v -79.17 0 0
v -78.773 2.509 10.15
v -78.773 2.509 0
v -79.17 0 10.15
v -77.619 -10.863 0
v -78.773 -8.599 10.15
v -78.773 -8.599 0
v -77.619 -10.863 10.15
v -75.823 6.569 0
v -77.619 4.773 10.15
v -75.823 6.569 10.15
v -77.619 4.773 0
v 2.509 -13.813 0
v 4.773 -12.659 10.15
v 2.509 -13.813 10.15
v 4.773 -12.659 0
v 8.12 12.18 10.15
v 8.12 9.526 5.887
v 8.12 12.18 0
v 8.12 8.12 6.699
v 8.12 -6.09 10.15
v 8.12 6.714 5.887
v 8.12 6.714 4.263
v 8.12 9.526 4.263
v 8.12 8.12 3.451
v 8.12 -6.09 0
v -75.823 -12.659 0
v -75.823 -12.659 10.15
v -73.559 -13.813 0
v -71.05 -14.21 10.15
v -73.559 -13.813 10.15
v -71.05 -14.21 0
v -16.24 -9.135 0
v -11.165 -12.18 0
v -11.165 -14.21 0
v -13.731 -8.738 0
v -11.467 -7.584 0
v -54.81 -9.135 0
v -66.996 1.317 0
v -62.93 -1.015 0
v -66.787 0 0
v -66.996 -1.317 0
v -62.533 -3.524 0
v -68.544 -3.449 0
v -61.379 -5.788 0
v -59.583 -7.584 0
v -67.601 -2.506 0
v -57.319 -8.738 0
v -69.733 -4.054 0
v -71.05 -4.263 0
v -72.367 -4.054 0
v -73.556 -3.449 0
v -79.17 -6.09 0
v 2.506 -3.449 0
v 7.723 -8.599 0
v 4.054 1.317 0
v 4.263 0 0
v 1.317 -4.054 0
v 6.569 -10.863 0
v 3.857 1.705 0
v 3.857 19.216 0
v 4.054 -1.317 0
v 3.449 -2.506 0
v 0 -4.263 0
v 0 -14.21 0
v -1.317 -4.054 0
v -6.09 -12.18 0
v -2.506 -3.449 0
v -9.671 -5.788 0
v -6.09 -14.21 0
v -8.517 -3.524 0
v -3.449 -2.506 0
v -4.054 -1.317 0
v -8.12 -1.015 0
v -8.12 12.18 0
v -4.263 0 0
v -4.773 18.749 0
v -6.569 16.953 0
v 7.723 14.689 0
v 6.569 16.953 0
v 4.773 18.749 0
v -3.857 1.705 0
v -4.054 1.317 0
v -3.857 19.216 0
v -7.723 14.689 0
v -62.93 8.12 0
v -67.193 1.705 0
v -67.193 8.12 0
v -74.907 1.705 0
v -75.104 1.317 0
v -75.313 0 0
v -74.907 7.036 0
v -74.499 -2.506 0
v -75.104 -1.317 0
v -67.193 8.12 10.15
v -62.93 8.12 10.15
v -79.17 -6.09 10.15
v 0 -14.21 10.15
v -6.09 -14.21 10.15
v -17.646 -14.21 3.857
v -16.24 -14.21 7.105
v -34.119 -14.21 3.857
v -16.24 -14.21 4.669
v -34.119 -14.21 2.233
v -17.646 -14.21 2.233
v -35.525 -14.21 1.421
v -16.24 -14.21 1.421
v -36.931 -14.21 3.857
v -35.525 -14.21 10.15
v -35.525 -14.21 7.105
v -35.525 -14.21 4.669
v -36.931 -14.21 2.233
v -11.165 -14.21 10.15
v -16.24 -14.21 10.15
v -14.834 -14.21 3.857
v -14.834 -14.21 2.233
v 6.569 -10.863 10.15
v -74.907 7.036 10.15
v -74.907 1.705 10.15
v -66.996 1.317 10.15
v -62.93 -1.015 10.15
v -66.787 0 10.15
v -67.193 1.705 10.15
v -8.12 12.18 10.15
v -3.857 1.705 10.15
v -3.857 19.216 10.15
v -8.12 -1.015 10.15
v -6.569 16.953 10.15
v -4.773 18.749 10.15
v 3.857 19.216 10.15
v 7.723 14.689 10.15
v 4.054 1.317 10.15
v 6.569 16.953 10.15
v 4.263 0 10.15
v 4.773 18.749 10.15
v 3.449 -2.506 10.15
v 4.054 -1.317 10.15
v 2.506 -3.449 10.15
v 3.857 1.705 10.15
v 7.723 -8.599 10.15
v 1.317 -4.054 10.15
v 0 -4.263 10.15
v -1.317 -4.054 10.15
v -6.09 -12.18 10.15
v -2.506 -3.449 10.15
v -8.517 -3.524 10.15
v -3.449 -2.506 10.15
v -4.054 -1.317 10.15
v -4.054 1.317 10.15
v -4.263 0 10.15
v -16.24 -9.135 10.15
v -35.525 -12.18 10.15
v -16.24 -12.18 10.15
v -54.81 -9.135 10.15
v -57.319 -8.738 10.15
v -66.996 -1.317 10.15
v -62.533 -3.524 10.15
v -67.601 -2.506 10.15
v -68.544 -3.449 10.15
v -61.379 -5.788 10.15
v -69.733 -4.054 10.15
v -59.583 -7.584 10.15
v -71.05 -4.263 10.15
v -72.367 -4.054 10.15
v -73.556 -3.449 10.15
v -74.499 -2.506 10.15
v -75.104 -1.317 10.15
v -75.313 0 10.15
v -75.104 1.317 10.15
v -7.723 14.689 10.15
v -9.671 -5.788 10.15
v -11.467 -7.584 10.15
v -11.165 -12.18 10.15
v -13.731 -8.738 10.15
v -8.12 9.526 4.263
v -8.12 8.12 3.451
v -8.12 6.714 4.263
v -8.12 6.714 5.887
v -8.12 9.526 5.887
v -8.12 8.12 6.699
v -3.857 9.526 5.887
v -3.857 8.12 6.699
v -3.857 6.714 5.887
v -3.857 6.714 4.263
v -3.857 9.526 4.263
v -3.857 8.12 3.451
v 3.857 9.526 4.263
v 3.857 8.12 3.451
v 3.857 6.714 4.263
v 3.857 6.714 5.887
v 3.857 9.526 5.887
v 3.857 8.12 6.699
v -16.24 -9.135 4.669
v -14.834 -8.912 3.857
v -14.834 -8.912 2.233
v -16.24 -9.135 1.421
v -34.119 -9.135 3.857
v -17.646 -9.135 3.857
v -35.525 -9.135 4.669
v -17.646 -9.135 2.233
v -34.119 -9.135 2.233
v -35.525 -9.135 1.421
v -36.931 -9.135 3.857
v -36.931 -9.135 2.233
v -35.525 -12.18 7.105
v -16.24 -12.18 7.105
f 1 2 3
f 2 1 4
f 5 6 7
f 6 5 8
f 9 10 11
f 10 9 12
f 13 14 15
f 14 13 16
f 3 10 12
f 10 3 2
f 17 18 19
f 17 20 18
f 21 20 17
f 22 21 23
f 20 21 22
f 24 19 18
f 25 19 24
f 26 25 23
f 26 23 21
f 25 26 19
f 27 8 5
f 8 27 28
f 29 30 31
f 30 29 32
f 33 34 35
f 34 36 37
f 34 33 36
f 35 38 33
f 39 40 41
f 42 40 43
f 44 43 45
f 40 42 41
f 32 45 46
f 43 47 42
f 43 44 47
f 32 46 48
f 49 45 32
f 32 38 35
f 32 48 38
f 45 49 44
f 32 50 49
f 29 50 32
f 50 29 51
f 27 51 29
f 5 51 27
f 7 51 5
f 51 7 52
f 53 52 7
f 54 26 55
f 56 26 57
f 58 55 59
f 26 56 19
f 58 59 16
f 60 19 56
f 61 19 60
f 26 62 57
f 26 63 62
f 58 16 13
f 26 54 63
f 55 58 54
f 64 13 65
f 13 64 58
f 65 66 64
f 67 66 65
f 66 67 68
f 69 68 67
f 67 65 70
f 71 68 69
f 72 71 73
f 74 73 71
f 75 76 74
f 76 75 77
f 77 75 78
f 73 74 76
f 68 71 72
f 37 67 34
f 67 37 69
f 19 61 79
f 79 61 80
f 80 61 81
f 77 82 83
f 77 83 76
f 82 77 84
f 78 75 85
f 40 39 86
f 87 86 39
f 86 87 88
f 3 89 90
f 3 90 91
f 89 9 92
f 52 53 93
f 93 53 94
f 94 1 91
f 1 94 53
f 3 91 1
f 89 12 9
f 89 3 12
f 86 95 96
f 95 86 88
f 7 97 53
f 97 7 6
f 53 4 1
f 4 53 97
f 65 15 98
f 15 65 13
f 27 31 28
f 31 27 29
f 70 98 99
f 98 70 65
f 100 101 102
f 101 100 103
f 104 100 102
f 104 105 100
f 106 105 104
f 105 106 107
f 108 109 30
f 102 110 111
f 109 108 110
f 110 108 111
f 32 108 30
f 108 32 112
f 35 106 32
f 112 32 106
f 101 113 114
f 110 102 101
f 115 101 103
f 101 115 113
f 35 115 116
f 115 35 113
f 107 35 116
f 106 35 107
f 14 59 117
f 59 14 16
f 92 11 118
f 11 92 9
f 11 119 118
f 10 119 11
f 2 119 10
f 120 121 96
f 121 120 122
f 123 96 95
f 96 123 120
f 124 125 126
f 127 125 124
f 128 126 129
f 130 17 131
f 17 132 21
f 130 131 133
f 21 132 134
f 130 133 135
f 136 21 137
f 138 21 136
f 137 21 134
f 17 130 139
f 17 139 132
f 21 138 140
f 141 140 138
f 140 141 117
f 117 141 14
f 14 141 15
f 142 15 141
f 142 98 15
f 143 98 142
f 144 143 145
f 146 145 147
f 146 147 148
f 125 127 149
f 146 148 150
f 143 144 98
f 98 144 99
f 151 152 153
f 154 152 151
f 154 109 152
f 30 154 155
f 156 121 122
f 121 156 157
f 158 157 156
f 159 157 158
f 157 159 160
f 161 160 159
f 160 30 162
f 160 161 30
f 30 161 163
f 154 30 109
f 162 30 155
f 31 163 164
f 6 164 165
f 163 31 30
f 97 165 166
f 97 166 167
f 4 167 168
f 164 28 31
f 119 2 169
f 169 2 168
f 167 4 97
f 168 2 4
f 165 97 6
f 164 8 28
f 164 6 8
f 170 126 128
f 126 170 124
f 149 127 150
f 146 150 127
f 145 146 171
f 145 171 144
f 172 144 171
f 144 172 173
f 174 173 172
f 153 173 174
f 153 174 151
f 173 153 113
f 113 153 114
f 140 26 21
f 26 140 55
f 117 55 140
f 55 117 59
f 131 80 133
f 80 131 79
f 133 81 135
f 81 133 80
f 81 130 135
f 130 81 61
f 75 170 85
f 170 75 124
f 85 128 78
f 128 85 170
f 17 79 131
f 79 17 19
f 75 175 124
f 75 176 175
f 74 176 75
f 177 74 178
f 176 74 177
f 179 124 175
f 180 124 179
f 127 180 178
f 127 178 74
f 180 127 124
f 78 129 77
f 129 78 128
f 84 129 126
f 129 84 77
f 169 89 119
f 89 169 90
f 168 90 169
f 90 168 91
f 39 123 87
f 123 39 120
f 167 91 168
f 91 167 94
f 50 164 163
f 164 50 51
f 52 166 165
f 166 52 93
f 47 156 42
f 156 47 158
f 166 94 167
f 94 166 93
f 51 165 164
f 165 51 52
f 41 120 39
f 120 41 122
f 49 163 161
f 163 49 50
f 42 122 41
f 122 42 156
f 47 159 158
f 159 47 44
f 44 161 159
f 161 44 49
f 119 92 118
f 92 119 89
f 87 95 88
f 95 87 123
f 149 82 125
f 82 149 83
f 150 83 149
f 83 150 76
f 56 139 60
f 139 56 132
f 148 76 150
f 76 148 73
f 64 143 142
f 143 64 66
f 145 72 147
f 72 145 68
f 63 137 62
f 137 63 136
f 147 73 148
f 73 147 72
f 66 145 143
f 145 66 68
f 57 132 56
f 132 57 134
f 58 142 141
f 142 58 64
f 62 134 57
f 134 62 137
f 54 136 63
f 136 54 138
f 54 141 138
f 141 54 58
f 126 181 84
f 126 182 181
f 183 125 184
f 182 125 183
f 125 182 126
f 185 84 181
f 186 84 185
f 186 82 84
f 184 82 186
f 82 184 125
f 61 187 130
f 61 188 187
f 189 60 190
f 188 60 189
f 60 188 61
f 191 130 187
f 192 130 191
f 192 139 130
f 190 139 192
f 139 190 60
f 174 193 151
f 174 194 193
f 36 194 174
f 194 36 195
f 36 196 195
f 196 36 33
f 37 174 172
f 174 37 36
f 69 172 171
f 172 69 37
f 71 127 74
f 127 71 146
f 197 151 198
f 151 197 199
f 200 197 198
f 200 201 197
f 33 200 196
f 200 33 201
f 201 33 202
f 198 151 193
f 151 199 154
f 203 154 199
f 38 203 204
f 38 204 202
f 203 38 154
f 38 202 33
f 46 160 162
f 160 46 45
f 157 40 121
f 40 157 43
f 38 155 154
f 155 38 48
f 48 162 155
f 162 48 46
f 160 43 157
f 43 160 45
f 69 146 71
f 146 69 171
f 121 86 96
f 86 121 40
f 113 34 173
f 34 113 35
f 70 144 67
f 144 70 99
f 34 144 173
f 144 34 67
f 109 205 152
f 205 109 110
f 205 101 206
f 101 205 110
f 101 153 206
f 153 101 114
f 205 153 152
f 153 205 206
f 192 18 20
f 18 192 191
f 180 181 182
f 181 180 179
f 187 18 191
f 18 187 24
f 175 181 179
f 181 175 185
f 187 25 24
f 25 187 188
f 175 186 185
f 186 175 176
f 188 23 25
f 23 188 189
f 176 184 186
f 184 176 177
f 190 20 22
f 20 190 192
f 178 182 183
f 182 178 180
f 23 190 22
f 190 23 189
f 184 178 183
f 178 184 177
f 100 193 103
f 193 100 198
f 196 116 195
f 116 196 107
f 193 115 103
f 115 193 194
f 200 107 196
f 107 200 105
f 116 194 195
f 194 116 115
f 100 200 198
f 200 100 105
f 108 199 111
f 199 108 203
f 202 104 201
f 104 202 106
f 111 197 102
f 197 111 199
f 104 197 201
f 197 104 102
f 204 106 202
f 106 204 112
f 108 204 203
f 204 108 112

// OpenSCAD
// file: configuration.scad
rod_radius = 6.0;
frame_rod_radius = 4.0;
z_threaded_rod_radius = 4.0;

y_rod_height = 70;
x_rod_spacing = 70;

bearing_radius = 11; 					// 608 bearing

//  LM8 = 7.5  LM10 = 9.5  LM12 = 10.5
linear_bearing_radius =  7.6;  // LM8 + some extra space

z_threaded_to_smooth_spacing = 30;   // 30mm is OK for 8mm rods 
x_end_threaded_rod_height = 20;
// main file
include <configuration.scad>

rod_spacing = x_rod_spacing;

//! x_endstop_bumper();

scale([1.015, 1.015, 1.015]){
	rotate([0,180,0]){
		translate([0,0,-10]){
			x_endstop(1);
		}
	}
}

module x_endstop_bumper(){
	rotate([90,0,0])
		linear_extrude(height=20)
			polygon( points=[[0,0],[12,0],[12,12]]);

}



module x_endstop(for_x_axis=0){

	union(){
	
		difference(){
	
			union(){
				
				hull(){
	
					cylinder(r=8, h=10, $fn=20);
					translate([rod_spacing, 0, 0])
						cylinder(r=8, h=10, $fn=20);
	
					translate([0, -6, 0]){
					cylinder(r=8, h=10, $fn=20);
					translate([rod_spacing, 0, 0])
						cylinder(r=8, h=10, $fn=20);
					}
				}
	
				hull(){
	
					cylinder(r=8, h=10, $fn=20);
					translate([0, 12, 0])
						cylinder(r=8, h=10, $fn=20);
	
				}
		
	
			}
	
			union(){
	
				translate([0,0,-1]){
	
					#cylinder(r=4.2, h=12, $fn=20);
					translate([-3.8,0,0])
						#cube([7.6,20,12]);
	
					translate([rod_spacing, 0, 0]){
						#cylinder(r=4.2, h=12, $fn=20);
						translate([-3.8,0,0])
							#cube([7.6,20,12]);
	
					}
	
					translate([16, -1, 0]){
						hull(){
	
							#cylinder(r=8, h=12, $fn=20);
							translate([rod_spacing - 32, 0, 0])
								#cylinder(r=8, h=12, $fn=20);
	
							translate([0, 16, 0]){
								#cylinder(r=8, h=12, $fn=20);
								translate([rod_spacing - 32, 0, 0])
									#cylinder(r=8, h=12, $fn=20);
							}
						}
	
					}
	
					translate([6, -15, 0]){
						#cube([5,3,12]);
					}
	
					translate([16, -15, 0]){
						#cube([19,3,4]);
					}
					
					if(!for_x_axis){
		
						translate([46, -15, 0]){
							#cube([40,40,13]);		
						}	
					}
	
				}
				
				translate([-10, 8, 5])
				rotate([0,90,0])
				#cylinder(r=1.6, h=20);
	
				translate([16, -4, 7])
				rotate([90,90,0])
				#cylinder(r=1.6, h=20);
	
				translate([35, -4, 7])   // 19mm spacing for pcb holes
				rotate([90,90,0])
				#cylinder(r=1.6, h=20);
	
				
	
	
	
			}
	
		}  // end diff
	
		if(!for_x_axis){
				translate([46, -10, 0])
				cylinder(r=4, h=10, $fn=20);
		}

	}    // end outer union

}
